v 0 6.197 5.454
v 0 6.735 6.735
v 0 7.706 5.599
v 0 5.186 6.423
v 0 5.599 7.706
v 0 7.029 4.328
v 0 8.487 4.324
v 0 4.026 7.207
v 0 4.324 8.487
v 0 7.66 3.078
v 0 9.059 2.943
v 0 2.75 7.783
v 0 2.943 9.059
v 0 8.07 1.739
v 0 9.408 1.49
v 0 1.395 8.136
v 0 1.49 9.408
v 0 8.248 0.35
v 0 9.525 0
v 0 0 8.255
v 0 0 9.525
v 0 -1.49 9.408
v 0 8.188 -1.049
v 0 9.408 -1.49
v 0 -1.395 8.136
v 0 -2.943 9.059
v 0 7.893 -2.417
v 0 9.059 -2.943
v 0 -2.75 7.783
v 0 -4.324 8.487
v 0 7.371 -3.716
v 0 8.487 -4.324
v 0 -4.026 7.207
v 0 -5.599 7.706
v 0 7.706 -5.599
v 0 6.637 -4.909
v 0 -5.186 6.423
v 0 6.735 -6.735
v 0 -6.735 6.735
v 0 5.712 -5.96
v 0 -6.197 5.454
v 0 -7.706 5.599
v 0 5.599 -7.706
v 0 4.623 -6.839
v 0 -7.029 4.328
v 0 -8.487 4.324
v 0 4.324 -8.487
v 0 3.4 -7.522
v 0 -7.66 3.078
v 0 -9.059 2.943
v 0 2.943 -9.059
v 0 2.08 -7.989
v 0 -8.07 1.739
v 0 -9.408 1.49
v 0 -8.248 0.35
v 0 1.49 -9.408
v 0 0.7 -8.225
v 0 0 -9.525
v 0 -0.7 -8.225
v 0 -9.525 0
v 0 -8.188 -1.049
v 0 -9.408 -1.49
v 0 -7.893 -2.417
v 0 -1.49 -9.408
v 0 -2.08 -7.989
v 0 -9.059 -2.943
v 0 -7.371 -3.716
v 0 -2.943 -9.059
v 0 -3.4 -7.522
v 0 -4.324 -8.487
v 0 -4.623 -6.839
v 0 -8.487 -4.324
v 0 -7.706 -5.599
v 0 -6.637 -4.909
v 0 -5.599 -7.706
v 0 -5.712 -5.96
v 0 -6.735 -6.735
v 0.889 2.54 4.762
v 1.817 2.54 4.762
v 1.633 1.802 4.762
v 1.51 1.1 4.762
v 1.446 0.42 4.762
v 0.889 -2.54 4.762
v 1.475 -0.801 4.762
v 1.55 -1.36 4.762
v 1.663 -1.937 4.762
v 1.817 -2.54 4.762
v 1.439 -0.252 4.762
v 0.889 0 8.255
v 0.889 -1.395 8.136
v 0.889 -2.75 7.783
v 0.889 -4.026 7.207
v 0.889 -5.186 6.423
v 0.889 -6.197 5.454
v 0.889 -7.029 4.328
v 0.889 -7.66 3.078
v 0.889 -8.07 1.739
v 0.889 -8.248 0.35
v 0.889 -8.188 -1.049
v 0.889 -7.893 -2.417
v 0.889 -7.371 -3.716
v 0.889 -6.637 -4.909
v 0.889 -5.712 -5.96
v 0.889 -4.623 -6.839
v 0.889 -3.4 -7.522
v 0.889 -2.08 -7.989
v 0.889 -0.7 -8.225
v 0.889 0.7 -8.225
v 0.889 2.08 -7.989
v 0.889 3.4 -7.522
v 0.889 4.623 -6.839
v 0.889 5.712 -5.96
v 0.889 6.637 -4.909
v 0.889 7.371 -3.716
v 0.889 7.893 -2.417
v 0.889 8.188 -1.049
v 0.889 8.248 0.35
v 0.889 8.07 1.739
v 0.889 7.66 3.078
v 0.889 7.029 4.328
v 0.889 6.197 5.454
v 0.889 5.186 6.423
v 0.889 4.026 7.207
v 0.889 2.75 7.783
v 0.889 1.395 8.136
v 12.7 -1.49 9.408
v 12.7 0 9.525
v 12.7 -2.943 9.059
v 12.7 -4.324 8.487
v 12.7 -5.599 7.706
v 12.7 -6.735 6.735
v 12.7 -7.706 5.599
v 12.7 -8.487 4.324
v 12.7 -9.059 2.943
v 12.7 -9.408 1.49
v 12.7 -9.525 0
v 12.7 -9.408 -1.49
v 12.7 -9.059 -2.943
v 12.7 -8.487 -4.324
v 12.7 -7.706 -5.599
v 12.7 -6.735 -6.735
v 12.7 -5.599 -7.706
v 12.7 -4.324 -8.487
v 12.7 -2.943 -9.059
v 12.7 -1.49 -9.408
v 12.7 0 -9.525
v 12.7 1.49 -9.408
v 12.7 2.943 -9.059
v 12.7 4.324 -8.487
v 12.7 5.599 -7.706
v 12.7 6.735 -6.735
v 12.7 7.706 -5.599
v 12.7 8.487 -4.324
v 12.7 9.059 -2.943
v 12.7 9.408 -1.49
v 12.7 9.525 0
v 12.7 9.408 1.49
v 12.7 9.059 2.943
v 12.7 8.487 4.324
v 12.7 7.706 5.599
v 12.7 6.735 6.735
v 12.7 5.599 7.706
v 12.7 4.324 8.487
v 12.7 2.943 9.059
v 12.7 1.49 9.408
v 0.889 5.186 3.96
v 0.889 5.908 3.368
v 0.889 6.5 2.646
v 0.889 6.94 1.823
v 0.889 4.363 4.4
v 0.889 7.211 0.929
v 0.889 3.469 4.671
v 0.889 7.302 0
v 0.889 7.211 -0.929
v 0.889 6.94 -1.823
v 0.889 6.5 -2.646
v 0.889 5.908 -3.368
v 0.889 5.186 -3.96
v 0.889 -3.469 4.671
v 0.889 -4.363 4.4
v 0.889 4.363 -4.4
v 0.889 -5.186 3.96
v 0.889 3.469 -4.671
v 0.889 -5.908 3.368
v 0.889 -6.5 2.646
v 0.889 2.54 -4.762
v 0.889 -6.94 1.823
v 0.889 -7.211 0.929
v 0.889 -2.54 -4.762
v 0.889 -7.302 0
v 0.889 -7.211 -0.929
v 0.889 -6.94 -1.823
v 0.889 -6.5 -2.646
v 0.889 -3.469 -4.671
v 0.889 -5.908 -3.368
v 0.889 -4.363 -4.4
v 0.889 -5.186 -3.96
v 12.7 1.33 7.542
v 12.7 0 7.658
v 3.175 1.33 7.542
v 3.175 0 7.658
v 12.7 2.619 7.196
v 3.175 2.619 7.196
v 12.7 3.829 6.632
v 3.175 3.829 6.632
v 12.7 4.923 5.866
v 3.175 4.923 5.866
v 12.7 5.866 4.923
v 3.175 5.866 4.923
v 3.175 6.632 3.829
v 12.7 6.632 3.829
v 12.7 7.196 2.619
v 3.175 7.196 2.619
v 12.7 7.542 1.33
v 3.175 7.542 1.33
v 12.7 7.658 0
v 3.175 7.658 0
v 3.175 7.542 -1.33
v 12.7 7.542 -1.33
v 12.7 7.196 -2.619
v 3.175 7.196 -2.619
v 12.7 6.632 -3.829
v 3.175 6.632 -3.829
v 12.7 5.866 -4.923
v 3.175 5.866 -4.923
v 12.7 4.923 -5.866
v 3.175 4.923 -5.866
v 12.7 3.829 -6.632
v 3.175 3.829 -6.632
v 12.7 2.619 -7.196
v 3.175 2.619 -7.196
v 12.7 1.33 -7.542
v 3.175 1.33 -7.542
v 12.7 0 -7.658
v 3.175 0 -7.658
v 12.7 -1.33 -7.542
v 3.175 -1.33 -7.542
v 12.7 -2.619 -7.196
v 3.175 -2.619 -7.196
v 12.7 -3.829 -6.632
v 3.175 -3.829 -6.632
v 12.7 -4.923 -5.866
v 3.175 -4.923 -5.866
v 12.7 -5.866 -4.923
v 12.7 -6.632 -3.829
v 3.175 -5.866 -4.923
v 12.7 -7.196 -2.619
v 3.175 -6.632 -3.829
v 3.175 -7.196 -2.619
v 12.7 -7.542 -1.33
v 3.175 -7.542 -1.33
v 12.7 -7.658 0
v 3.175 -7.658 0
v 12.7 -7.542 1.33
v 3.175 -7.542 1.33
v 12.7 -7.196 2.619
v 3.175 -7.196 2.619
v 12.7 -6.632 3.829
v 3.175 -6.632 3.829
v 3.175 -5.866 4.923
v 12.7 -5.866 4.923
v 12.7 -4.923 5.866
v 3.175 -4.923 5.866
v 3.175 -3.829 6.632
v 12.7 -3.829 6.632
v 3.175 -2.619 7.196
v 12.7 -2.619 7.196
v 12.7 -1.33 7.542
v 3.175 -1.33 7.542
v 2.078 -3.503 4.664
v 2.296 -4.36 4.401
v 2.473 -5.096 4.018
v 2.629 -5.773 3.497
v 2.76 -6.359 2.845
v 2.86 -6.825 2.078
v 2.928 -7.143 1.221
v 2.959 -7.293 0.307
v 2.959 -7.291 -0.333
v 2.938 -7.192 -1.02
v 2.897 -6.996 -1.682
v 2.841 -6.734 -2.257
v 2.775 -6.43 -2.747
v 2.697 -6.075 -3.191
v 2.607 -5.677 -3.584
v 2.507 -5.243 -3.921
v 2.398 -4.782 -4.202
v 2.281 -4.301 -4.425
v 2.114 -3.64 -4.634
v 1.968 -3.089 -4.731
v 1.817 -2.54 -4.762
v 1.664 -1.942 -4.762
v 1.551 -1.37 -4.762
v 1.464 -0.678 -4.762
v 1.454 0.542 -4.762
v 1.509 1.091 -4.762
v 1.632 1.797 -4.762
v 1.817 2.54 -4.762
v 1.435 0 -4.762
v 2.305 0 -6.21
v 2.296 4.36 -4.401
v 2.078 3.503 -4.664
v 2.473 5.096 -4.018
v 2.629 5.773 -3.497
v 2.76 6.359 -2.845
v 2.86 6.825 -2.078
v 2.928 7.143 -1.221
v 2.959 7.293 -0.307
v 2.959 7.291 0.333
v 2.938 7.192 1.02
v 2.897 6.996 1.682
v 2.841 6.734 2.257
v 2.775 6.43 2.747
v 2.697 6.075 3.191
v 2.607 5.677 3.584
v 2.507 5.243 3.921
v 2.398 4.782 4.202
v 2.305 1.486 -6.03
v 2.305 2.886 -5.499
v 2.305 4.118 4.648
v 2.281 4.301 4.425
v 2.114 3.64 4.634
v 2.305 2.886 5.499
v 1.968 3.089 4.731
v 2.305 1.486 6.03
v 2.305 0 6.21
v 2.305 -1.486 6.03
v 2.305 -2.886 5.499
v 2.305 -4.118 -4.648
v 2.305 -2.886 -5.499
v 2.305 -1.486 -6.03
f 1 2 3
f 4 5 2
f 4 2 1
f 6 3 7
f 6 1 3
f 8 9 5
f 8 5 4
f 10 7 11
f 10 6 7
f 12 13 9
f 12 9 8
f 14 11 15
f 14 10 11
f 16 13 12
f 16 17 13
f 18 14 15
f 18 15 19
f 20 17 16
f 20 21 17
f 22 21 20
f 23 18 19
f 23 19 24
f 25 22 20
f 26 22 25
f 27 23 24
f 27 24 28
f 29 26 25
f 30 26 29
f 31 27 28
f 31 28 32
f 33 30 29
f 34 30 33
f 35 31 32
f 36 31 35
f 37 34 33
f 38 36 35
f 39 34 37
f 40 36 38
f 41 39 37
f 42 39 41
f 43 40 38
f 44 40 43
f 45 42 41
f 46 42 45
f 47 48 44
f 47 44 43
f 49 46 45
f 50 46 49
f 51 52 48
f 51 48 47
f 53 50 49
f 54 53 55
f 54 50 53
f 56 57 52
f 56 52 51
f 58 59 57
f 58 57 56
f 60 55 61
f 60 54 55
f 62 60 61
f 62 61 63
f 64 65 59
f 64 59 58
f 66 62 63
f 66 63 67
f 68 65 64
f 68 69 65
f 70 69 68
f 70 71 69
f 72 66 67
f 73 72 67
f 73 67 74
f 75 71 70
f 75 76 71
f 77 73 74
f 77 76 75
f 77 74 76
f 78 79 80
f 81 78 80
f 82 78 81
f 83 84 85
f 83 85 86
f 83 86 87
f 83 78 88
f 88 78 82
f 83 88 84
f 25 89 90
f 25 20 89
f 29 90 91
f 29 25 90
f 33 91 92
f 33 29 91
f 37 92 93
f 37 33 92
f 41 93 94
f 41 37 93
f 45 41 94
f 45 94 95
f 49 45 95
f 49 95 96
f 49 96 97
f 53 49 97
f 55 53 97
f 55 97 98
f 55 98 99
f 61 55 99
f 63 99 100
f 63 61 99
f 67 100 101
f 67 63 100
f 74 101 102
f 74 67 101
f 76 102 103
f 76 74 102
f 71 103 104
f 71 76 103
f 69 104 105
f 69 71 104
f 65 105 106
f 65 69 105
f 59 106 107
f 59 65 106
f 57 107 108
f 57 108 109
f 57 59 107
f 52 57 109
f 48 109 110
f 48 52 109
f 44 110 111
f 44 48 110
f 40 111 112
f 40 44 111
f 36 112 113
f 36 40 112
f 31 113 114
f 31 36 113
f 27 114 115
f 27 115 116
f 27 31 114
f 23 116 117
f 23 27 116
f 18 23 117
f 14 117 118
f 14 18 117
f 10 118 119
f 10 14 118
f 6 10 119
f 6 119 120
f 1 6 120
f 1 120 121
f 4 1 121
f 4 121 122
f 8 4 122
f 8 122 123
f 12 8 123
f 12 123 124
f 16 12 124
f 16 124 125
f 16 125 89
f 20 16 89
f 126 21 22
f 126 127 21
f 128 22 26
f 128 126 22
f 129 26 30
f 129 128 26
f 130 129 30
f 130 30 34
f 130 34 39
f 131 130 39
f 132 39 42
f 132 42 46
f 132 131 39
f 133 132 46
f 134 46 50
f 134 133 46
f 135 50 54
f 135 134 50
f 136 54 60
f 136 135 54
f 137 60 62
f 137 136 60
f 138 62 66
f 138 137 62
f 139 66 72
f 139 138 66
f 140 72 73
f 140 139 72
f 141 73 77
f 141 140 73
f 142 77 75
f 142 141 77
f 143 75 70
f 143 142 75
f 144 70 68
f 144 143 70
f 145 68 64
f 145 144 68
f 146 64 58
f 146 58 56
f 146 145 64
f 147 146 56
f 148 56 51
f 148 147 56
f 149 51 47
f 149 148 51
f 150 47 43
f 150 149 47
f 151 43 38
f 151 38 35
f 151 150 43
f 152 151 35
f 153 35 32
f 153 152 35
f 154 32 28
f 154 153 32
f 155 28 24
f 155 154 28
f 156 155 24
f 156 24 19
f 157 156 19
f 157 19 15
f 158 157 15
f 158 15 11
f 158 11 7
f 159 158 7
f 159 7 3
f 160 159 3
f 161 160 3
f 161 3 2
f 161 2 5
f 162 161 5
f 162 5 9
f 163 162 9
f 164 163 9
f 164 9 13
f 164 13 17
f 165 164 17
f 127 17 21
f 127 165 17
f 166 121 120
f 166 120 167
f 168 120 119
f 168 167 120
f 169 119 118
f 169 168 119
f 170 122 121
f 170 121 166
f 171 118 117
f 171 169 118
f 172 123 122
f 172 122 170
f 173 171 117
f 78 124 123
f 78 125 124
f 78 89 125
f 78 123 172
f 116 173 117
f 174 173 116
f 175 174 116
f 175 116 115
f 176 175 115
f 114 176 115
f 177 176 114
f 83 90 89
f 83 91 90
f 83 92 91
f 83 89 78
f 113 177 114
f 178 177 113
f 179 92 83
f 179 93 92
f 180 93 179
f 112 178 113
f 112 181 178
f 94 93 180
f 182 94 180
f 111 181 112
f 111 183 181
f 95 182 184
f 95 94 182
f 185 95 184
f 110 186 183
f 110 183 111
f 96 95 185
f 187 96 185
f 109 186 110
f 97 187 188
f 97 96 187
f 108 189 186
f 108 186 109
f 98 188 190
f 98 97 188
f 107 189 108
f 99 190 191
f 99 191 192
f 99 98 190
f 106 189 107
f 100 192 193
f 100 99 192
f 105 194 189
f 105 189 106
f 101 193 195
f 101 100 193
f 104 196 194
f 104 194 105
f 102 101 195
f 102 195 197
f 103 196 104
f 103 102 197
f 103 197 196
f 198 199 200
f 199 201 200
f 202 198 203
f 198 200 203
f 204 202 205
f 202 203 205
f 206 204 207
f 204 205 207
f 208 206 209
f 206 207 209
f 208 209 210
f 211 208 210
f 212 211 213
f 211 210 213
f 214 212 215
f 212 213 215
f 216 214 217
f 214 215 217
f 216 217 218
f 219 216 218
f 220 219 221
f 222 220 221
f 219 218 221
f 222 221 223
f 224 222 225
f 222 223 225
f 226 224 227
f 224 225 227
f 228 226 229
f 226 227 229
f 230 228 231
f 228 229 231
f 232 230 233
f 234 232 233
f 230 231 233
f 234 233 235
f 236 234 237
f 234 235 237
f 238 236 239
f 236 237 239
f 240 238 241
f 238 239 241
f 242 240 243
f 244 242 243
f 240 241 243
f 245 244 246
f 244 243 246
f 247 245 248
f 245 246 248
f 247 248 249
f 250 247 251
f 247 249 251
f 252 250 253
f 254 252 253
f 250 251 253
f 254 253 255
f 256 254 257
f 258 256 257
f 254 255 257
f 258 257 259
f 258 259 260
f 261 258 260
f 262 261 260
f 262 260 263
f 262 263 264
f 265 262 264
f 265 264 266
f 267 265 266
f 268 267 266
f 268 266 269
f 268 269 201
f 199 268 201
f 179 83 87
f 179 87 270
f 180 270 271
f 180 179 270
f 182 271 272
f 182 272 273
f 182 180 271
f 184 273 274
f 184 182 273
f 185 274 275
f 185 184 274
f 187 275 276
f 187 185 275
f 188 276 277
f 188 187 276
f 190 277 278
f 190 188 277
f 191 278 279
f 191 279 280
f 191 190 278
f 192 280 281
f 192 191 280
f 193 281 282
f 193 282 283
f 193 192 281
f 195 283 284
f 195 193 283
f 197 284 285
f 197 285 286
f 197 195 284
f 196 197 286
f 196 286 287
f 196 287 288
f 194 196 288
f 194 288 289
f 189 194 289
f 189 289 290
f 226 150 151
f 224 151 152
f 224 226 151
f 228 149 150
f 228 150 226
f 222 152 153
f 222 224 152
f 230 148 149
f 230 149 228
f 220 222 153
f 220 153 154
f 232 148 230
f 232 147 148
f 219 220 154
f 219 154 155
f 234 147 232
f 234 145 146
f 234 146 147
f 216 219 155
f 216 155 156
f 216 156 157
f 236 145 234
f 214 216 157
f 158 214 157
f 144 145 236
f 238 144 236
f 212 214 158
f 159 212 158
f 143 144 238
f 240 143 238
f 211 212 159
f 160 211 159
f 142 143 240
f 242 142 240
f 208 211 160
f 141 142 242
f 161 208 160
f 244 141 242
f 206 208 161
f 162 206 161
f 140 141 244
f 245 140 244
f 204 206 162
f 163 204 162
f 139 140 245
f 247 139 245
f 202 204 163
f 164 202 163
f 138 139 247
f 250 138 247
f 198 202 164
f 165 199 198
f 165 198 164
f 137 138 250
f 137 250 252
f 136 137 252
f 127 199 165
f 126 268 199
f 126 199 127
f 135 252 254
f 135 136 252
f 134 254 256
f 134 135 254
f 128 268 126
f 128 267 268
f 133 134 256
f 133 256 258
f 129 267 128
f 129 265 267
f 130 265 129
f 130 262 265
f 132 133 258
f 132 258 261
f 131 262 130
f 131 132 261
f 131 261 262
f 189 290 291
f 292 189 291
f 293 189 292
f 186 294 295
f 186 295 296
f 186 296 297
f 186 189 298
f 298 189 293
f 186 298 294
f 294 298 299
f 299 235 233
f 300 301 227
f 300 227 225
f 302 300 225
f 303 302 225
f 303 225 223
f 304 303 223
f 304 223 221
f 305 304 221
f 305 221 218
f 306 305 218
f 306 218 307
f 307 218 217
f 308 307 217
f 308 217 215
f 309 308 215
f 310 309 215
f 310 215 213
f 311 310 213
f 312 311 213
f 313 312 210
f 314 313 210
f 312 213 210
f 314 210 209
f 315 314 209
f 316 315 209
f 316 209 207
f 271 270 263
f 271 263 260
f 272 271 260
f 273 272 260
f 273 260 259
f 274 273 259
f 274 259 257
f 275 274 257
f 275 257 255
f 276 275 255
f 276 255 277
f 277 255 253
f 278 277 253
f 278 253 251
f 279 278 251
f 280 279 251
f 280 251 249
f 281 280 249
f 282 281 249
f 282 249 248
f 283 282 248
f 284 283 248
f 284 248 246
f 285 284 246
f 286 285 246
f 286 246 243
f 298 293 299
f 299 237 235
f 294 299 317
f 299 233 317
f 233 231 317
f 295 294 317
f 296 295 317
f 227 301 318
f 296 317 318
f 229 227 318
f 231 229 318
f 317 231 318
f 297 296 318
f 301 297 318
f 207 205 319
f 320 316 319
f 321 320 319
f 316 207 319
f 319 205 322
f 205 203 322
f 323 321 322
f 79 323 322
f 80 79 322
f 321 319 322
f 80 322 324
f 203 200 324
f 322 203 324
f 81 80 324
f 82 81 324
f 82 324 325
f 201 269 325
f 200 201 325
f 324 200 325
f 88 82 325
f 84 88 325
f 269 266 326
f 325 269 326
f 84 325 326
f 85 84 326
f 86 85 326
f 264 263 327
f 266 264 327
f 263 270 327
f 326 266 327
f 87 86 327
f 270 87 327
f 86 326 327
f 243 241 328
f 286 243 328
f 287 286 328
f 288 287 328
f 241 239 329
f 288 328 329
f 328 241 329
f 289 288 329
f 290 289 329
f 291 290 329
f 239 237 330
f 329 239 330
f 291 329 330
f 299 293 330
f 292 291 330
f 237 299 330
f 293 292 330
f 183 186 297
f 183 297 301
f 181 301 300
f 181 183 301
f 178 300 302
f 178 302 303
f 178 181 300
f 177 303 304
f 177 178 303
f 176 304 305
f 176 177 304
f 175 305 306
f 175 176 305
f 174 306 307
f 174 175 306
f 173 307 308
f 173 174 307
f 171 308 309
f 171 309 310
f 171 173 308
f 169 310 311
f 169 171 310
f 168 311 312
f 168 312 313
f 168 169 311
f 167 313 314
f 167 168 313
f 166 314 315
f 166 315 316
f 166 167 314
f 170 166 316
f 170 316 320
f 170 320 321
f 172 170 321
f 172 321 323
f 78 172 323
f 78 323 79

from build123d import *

# Parameters (mm, degrees)
CUT_EXTRUDE1_DEPTH               = 18.915104549
F_3_8_18_NPSM_TAPPED_HOLE1_D     = 15.3162
F_3_8_18_NPSM_TAPPED_HOLE1_DEPTH = 9.525
F_3_8_18_NPSM_TAPPED_HOLE1_TIP   = 4.601450707


with BuildPart() as part:
    # Sketch1 → Revolve1 (revolve)
    with BuildSketch(Plane.XY, mode=Mode.PRIVATE) as revolve1_sk:
        Polygon((0, 9.525), (12.7, 9.525), (12.7, 0), (0.889, 0), (0.889, 8.255), (0, 8.255), align=None)
    revolve(revolve1_sk.sketch.rotate(Axis((0, 0, 0), (1, 0, 0)), 90), axis=Axis((0, 0, 0), (1, 0, 0)))

    # Sketch2 → Cut-Extrude1 (cut, through all)
    with BuildSketch(Plane.ZY.offset(-0.889)):
        with BuildLine():
            Line((-4.7625, -2.54), (-4.7625, 2.54))
            ThreePointArc((-4.7625, 2.54), (0, 7.3025), (4.7625, 2.54))
            Line((4.7625, 2.54), (4.7625, -2.54))
            ThreePointArc((4.7625, -2.54), (0, -7.3025), (-4.7625, -2.54))
        make_face()
    extrude(amount=-CUT_EXTRUDE1_DEPTH, mode=Mode.SUBTRACT)

    # 3/8-18 NPSM Tapped Hole1
    with Locations(Plane(origin=(12.7, 0, 0), x_dir=(0, 0, -1), z_dir=(1, 0, 0))):
        with Locations((0, 0)):
            Hole(F_3_8_18_NPSM_TAPPED_HOLE1_D / 2, depth=F_3_8_18_NPSM_TAPPED_HOLE1_DEPTH)
            with Locations((0, 0, -(F_3_8_18_NPSM_TAPPED_HOLE1_DEPTH + F_3_8_18_NPSM_TAPPED_HOLE1_TIP / 2))):  # 118° drill point
                Cone(0, F_3_8_18_NPSM_TAPPED_HOLE1_D / 2, F_3_8_18_NPSM_TAPPED_HOLE1_TIP, mode=Mode.SUBTRACT)


solid = part.part
